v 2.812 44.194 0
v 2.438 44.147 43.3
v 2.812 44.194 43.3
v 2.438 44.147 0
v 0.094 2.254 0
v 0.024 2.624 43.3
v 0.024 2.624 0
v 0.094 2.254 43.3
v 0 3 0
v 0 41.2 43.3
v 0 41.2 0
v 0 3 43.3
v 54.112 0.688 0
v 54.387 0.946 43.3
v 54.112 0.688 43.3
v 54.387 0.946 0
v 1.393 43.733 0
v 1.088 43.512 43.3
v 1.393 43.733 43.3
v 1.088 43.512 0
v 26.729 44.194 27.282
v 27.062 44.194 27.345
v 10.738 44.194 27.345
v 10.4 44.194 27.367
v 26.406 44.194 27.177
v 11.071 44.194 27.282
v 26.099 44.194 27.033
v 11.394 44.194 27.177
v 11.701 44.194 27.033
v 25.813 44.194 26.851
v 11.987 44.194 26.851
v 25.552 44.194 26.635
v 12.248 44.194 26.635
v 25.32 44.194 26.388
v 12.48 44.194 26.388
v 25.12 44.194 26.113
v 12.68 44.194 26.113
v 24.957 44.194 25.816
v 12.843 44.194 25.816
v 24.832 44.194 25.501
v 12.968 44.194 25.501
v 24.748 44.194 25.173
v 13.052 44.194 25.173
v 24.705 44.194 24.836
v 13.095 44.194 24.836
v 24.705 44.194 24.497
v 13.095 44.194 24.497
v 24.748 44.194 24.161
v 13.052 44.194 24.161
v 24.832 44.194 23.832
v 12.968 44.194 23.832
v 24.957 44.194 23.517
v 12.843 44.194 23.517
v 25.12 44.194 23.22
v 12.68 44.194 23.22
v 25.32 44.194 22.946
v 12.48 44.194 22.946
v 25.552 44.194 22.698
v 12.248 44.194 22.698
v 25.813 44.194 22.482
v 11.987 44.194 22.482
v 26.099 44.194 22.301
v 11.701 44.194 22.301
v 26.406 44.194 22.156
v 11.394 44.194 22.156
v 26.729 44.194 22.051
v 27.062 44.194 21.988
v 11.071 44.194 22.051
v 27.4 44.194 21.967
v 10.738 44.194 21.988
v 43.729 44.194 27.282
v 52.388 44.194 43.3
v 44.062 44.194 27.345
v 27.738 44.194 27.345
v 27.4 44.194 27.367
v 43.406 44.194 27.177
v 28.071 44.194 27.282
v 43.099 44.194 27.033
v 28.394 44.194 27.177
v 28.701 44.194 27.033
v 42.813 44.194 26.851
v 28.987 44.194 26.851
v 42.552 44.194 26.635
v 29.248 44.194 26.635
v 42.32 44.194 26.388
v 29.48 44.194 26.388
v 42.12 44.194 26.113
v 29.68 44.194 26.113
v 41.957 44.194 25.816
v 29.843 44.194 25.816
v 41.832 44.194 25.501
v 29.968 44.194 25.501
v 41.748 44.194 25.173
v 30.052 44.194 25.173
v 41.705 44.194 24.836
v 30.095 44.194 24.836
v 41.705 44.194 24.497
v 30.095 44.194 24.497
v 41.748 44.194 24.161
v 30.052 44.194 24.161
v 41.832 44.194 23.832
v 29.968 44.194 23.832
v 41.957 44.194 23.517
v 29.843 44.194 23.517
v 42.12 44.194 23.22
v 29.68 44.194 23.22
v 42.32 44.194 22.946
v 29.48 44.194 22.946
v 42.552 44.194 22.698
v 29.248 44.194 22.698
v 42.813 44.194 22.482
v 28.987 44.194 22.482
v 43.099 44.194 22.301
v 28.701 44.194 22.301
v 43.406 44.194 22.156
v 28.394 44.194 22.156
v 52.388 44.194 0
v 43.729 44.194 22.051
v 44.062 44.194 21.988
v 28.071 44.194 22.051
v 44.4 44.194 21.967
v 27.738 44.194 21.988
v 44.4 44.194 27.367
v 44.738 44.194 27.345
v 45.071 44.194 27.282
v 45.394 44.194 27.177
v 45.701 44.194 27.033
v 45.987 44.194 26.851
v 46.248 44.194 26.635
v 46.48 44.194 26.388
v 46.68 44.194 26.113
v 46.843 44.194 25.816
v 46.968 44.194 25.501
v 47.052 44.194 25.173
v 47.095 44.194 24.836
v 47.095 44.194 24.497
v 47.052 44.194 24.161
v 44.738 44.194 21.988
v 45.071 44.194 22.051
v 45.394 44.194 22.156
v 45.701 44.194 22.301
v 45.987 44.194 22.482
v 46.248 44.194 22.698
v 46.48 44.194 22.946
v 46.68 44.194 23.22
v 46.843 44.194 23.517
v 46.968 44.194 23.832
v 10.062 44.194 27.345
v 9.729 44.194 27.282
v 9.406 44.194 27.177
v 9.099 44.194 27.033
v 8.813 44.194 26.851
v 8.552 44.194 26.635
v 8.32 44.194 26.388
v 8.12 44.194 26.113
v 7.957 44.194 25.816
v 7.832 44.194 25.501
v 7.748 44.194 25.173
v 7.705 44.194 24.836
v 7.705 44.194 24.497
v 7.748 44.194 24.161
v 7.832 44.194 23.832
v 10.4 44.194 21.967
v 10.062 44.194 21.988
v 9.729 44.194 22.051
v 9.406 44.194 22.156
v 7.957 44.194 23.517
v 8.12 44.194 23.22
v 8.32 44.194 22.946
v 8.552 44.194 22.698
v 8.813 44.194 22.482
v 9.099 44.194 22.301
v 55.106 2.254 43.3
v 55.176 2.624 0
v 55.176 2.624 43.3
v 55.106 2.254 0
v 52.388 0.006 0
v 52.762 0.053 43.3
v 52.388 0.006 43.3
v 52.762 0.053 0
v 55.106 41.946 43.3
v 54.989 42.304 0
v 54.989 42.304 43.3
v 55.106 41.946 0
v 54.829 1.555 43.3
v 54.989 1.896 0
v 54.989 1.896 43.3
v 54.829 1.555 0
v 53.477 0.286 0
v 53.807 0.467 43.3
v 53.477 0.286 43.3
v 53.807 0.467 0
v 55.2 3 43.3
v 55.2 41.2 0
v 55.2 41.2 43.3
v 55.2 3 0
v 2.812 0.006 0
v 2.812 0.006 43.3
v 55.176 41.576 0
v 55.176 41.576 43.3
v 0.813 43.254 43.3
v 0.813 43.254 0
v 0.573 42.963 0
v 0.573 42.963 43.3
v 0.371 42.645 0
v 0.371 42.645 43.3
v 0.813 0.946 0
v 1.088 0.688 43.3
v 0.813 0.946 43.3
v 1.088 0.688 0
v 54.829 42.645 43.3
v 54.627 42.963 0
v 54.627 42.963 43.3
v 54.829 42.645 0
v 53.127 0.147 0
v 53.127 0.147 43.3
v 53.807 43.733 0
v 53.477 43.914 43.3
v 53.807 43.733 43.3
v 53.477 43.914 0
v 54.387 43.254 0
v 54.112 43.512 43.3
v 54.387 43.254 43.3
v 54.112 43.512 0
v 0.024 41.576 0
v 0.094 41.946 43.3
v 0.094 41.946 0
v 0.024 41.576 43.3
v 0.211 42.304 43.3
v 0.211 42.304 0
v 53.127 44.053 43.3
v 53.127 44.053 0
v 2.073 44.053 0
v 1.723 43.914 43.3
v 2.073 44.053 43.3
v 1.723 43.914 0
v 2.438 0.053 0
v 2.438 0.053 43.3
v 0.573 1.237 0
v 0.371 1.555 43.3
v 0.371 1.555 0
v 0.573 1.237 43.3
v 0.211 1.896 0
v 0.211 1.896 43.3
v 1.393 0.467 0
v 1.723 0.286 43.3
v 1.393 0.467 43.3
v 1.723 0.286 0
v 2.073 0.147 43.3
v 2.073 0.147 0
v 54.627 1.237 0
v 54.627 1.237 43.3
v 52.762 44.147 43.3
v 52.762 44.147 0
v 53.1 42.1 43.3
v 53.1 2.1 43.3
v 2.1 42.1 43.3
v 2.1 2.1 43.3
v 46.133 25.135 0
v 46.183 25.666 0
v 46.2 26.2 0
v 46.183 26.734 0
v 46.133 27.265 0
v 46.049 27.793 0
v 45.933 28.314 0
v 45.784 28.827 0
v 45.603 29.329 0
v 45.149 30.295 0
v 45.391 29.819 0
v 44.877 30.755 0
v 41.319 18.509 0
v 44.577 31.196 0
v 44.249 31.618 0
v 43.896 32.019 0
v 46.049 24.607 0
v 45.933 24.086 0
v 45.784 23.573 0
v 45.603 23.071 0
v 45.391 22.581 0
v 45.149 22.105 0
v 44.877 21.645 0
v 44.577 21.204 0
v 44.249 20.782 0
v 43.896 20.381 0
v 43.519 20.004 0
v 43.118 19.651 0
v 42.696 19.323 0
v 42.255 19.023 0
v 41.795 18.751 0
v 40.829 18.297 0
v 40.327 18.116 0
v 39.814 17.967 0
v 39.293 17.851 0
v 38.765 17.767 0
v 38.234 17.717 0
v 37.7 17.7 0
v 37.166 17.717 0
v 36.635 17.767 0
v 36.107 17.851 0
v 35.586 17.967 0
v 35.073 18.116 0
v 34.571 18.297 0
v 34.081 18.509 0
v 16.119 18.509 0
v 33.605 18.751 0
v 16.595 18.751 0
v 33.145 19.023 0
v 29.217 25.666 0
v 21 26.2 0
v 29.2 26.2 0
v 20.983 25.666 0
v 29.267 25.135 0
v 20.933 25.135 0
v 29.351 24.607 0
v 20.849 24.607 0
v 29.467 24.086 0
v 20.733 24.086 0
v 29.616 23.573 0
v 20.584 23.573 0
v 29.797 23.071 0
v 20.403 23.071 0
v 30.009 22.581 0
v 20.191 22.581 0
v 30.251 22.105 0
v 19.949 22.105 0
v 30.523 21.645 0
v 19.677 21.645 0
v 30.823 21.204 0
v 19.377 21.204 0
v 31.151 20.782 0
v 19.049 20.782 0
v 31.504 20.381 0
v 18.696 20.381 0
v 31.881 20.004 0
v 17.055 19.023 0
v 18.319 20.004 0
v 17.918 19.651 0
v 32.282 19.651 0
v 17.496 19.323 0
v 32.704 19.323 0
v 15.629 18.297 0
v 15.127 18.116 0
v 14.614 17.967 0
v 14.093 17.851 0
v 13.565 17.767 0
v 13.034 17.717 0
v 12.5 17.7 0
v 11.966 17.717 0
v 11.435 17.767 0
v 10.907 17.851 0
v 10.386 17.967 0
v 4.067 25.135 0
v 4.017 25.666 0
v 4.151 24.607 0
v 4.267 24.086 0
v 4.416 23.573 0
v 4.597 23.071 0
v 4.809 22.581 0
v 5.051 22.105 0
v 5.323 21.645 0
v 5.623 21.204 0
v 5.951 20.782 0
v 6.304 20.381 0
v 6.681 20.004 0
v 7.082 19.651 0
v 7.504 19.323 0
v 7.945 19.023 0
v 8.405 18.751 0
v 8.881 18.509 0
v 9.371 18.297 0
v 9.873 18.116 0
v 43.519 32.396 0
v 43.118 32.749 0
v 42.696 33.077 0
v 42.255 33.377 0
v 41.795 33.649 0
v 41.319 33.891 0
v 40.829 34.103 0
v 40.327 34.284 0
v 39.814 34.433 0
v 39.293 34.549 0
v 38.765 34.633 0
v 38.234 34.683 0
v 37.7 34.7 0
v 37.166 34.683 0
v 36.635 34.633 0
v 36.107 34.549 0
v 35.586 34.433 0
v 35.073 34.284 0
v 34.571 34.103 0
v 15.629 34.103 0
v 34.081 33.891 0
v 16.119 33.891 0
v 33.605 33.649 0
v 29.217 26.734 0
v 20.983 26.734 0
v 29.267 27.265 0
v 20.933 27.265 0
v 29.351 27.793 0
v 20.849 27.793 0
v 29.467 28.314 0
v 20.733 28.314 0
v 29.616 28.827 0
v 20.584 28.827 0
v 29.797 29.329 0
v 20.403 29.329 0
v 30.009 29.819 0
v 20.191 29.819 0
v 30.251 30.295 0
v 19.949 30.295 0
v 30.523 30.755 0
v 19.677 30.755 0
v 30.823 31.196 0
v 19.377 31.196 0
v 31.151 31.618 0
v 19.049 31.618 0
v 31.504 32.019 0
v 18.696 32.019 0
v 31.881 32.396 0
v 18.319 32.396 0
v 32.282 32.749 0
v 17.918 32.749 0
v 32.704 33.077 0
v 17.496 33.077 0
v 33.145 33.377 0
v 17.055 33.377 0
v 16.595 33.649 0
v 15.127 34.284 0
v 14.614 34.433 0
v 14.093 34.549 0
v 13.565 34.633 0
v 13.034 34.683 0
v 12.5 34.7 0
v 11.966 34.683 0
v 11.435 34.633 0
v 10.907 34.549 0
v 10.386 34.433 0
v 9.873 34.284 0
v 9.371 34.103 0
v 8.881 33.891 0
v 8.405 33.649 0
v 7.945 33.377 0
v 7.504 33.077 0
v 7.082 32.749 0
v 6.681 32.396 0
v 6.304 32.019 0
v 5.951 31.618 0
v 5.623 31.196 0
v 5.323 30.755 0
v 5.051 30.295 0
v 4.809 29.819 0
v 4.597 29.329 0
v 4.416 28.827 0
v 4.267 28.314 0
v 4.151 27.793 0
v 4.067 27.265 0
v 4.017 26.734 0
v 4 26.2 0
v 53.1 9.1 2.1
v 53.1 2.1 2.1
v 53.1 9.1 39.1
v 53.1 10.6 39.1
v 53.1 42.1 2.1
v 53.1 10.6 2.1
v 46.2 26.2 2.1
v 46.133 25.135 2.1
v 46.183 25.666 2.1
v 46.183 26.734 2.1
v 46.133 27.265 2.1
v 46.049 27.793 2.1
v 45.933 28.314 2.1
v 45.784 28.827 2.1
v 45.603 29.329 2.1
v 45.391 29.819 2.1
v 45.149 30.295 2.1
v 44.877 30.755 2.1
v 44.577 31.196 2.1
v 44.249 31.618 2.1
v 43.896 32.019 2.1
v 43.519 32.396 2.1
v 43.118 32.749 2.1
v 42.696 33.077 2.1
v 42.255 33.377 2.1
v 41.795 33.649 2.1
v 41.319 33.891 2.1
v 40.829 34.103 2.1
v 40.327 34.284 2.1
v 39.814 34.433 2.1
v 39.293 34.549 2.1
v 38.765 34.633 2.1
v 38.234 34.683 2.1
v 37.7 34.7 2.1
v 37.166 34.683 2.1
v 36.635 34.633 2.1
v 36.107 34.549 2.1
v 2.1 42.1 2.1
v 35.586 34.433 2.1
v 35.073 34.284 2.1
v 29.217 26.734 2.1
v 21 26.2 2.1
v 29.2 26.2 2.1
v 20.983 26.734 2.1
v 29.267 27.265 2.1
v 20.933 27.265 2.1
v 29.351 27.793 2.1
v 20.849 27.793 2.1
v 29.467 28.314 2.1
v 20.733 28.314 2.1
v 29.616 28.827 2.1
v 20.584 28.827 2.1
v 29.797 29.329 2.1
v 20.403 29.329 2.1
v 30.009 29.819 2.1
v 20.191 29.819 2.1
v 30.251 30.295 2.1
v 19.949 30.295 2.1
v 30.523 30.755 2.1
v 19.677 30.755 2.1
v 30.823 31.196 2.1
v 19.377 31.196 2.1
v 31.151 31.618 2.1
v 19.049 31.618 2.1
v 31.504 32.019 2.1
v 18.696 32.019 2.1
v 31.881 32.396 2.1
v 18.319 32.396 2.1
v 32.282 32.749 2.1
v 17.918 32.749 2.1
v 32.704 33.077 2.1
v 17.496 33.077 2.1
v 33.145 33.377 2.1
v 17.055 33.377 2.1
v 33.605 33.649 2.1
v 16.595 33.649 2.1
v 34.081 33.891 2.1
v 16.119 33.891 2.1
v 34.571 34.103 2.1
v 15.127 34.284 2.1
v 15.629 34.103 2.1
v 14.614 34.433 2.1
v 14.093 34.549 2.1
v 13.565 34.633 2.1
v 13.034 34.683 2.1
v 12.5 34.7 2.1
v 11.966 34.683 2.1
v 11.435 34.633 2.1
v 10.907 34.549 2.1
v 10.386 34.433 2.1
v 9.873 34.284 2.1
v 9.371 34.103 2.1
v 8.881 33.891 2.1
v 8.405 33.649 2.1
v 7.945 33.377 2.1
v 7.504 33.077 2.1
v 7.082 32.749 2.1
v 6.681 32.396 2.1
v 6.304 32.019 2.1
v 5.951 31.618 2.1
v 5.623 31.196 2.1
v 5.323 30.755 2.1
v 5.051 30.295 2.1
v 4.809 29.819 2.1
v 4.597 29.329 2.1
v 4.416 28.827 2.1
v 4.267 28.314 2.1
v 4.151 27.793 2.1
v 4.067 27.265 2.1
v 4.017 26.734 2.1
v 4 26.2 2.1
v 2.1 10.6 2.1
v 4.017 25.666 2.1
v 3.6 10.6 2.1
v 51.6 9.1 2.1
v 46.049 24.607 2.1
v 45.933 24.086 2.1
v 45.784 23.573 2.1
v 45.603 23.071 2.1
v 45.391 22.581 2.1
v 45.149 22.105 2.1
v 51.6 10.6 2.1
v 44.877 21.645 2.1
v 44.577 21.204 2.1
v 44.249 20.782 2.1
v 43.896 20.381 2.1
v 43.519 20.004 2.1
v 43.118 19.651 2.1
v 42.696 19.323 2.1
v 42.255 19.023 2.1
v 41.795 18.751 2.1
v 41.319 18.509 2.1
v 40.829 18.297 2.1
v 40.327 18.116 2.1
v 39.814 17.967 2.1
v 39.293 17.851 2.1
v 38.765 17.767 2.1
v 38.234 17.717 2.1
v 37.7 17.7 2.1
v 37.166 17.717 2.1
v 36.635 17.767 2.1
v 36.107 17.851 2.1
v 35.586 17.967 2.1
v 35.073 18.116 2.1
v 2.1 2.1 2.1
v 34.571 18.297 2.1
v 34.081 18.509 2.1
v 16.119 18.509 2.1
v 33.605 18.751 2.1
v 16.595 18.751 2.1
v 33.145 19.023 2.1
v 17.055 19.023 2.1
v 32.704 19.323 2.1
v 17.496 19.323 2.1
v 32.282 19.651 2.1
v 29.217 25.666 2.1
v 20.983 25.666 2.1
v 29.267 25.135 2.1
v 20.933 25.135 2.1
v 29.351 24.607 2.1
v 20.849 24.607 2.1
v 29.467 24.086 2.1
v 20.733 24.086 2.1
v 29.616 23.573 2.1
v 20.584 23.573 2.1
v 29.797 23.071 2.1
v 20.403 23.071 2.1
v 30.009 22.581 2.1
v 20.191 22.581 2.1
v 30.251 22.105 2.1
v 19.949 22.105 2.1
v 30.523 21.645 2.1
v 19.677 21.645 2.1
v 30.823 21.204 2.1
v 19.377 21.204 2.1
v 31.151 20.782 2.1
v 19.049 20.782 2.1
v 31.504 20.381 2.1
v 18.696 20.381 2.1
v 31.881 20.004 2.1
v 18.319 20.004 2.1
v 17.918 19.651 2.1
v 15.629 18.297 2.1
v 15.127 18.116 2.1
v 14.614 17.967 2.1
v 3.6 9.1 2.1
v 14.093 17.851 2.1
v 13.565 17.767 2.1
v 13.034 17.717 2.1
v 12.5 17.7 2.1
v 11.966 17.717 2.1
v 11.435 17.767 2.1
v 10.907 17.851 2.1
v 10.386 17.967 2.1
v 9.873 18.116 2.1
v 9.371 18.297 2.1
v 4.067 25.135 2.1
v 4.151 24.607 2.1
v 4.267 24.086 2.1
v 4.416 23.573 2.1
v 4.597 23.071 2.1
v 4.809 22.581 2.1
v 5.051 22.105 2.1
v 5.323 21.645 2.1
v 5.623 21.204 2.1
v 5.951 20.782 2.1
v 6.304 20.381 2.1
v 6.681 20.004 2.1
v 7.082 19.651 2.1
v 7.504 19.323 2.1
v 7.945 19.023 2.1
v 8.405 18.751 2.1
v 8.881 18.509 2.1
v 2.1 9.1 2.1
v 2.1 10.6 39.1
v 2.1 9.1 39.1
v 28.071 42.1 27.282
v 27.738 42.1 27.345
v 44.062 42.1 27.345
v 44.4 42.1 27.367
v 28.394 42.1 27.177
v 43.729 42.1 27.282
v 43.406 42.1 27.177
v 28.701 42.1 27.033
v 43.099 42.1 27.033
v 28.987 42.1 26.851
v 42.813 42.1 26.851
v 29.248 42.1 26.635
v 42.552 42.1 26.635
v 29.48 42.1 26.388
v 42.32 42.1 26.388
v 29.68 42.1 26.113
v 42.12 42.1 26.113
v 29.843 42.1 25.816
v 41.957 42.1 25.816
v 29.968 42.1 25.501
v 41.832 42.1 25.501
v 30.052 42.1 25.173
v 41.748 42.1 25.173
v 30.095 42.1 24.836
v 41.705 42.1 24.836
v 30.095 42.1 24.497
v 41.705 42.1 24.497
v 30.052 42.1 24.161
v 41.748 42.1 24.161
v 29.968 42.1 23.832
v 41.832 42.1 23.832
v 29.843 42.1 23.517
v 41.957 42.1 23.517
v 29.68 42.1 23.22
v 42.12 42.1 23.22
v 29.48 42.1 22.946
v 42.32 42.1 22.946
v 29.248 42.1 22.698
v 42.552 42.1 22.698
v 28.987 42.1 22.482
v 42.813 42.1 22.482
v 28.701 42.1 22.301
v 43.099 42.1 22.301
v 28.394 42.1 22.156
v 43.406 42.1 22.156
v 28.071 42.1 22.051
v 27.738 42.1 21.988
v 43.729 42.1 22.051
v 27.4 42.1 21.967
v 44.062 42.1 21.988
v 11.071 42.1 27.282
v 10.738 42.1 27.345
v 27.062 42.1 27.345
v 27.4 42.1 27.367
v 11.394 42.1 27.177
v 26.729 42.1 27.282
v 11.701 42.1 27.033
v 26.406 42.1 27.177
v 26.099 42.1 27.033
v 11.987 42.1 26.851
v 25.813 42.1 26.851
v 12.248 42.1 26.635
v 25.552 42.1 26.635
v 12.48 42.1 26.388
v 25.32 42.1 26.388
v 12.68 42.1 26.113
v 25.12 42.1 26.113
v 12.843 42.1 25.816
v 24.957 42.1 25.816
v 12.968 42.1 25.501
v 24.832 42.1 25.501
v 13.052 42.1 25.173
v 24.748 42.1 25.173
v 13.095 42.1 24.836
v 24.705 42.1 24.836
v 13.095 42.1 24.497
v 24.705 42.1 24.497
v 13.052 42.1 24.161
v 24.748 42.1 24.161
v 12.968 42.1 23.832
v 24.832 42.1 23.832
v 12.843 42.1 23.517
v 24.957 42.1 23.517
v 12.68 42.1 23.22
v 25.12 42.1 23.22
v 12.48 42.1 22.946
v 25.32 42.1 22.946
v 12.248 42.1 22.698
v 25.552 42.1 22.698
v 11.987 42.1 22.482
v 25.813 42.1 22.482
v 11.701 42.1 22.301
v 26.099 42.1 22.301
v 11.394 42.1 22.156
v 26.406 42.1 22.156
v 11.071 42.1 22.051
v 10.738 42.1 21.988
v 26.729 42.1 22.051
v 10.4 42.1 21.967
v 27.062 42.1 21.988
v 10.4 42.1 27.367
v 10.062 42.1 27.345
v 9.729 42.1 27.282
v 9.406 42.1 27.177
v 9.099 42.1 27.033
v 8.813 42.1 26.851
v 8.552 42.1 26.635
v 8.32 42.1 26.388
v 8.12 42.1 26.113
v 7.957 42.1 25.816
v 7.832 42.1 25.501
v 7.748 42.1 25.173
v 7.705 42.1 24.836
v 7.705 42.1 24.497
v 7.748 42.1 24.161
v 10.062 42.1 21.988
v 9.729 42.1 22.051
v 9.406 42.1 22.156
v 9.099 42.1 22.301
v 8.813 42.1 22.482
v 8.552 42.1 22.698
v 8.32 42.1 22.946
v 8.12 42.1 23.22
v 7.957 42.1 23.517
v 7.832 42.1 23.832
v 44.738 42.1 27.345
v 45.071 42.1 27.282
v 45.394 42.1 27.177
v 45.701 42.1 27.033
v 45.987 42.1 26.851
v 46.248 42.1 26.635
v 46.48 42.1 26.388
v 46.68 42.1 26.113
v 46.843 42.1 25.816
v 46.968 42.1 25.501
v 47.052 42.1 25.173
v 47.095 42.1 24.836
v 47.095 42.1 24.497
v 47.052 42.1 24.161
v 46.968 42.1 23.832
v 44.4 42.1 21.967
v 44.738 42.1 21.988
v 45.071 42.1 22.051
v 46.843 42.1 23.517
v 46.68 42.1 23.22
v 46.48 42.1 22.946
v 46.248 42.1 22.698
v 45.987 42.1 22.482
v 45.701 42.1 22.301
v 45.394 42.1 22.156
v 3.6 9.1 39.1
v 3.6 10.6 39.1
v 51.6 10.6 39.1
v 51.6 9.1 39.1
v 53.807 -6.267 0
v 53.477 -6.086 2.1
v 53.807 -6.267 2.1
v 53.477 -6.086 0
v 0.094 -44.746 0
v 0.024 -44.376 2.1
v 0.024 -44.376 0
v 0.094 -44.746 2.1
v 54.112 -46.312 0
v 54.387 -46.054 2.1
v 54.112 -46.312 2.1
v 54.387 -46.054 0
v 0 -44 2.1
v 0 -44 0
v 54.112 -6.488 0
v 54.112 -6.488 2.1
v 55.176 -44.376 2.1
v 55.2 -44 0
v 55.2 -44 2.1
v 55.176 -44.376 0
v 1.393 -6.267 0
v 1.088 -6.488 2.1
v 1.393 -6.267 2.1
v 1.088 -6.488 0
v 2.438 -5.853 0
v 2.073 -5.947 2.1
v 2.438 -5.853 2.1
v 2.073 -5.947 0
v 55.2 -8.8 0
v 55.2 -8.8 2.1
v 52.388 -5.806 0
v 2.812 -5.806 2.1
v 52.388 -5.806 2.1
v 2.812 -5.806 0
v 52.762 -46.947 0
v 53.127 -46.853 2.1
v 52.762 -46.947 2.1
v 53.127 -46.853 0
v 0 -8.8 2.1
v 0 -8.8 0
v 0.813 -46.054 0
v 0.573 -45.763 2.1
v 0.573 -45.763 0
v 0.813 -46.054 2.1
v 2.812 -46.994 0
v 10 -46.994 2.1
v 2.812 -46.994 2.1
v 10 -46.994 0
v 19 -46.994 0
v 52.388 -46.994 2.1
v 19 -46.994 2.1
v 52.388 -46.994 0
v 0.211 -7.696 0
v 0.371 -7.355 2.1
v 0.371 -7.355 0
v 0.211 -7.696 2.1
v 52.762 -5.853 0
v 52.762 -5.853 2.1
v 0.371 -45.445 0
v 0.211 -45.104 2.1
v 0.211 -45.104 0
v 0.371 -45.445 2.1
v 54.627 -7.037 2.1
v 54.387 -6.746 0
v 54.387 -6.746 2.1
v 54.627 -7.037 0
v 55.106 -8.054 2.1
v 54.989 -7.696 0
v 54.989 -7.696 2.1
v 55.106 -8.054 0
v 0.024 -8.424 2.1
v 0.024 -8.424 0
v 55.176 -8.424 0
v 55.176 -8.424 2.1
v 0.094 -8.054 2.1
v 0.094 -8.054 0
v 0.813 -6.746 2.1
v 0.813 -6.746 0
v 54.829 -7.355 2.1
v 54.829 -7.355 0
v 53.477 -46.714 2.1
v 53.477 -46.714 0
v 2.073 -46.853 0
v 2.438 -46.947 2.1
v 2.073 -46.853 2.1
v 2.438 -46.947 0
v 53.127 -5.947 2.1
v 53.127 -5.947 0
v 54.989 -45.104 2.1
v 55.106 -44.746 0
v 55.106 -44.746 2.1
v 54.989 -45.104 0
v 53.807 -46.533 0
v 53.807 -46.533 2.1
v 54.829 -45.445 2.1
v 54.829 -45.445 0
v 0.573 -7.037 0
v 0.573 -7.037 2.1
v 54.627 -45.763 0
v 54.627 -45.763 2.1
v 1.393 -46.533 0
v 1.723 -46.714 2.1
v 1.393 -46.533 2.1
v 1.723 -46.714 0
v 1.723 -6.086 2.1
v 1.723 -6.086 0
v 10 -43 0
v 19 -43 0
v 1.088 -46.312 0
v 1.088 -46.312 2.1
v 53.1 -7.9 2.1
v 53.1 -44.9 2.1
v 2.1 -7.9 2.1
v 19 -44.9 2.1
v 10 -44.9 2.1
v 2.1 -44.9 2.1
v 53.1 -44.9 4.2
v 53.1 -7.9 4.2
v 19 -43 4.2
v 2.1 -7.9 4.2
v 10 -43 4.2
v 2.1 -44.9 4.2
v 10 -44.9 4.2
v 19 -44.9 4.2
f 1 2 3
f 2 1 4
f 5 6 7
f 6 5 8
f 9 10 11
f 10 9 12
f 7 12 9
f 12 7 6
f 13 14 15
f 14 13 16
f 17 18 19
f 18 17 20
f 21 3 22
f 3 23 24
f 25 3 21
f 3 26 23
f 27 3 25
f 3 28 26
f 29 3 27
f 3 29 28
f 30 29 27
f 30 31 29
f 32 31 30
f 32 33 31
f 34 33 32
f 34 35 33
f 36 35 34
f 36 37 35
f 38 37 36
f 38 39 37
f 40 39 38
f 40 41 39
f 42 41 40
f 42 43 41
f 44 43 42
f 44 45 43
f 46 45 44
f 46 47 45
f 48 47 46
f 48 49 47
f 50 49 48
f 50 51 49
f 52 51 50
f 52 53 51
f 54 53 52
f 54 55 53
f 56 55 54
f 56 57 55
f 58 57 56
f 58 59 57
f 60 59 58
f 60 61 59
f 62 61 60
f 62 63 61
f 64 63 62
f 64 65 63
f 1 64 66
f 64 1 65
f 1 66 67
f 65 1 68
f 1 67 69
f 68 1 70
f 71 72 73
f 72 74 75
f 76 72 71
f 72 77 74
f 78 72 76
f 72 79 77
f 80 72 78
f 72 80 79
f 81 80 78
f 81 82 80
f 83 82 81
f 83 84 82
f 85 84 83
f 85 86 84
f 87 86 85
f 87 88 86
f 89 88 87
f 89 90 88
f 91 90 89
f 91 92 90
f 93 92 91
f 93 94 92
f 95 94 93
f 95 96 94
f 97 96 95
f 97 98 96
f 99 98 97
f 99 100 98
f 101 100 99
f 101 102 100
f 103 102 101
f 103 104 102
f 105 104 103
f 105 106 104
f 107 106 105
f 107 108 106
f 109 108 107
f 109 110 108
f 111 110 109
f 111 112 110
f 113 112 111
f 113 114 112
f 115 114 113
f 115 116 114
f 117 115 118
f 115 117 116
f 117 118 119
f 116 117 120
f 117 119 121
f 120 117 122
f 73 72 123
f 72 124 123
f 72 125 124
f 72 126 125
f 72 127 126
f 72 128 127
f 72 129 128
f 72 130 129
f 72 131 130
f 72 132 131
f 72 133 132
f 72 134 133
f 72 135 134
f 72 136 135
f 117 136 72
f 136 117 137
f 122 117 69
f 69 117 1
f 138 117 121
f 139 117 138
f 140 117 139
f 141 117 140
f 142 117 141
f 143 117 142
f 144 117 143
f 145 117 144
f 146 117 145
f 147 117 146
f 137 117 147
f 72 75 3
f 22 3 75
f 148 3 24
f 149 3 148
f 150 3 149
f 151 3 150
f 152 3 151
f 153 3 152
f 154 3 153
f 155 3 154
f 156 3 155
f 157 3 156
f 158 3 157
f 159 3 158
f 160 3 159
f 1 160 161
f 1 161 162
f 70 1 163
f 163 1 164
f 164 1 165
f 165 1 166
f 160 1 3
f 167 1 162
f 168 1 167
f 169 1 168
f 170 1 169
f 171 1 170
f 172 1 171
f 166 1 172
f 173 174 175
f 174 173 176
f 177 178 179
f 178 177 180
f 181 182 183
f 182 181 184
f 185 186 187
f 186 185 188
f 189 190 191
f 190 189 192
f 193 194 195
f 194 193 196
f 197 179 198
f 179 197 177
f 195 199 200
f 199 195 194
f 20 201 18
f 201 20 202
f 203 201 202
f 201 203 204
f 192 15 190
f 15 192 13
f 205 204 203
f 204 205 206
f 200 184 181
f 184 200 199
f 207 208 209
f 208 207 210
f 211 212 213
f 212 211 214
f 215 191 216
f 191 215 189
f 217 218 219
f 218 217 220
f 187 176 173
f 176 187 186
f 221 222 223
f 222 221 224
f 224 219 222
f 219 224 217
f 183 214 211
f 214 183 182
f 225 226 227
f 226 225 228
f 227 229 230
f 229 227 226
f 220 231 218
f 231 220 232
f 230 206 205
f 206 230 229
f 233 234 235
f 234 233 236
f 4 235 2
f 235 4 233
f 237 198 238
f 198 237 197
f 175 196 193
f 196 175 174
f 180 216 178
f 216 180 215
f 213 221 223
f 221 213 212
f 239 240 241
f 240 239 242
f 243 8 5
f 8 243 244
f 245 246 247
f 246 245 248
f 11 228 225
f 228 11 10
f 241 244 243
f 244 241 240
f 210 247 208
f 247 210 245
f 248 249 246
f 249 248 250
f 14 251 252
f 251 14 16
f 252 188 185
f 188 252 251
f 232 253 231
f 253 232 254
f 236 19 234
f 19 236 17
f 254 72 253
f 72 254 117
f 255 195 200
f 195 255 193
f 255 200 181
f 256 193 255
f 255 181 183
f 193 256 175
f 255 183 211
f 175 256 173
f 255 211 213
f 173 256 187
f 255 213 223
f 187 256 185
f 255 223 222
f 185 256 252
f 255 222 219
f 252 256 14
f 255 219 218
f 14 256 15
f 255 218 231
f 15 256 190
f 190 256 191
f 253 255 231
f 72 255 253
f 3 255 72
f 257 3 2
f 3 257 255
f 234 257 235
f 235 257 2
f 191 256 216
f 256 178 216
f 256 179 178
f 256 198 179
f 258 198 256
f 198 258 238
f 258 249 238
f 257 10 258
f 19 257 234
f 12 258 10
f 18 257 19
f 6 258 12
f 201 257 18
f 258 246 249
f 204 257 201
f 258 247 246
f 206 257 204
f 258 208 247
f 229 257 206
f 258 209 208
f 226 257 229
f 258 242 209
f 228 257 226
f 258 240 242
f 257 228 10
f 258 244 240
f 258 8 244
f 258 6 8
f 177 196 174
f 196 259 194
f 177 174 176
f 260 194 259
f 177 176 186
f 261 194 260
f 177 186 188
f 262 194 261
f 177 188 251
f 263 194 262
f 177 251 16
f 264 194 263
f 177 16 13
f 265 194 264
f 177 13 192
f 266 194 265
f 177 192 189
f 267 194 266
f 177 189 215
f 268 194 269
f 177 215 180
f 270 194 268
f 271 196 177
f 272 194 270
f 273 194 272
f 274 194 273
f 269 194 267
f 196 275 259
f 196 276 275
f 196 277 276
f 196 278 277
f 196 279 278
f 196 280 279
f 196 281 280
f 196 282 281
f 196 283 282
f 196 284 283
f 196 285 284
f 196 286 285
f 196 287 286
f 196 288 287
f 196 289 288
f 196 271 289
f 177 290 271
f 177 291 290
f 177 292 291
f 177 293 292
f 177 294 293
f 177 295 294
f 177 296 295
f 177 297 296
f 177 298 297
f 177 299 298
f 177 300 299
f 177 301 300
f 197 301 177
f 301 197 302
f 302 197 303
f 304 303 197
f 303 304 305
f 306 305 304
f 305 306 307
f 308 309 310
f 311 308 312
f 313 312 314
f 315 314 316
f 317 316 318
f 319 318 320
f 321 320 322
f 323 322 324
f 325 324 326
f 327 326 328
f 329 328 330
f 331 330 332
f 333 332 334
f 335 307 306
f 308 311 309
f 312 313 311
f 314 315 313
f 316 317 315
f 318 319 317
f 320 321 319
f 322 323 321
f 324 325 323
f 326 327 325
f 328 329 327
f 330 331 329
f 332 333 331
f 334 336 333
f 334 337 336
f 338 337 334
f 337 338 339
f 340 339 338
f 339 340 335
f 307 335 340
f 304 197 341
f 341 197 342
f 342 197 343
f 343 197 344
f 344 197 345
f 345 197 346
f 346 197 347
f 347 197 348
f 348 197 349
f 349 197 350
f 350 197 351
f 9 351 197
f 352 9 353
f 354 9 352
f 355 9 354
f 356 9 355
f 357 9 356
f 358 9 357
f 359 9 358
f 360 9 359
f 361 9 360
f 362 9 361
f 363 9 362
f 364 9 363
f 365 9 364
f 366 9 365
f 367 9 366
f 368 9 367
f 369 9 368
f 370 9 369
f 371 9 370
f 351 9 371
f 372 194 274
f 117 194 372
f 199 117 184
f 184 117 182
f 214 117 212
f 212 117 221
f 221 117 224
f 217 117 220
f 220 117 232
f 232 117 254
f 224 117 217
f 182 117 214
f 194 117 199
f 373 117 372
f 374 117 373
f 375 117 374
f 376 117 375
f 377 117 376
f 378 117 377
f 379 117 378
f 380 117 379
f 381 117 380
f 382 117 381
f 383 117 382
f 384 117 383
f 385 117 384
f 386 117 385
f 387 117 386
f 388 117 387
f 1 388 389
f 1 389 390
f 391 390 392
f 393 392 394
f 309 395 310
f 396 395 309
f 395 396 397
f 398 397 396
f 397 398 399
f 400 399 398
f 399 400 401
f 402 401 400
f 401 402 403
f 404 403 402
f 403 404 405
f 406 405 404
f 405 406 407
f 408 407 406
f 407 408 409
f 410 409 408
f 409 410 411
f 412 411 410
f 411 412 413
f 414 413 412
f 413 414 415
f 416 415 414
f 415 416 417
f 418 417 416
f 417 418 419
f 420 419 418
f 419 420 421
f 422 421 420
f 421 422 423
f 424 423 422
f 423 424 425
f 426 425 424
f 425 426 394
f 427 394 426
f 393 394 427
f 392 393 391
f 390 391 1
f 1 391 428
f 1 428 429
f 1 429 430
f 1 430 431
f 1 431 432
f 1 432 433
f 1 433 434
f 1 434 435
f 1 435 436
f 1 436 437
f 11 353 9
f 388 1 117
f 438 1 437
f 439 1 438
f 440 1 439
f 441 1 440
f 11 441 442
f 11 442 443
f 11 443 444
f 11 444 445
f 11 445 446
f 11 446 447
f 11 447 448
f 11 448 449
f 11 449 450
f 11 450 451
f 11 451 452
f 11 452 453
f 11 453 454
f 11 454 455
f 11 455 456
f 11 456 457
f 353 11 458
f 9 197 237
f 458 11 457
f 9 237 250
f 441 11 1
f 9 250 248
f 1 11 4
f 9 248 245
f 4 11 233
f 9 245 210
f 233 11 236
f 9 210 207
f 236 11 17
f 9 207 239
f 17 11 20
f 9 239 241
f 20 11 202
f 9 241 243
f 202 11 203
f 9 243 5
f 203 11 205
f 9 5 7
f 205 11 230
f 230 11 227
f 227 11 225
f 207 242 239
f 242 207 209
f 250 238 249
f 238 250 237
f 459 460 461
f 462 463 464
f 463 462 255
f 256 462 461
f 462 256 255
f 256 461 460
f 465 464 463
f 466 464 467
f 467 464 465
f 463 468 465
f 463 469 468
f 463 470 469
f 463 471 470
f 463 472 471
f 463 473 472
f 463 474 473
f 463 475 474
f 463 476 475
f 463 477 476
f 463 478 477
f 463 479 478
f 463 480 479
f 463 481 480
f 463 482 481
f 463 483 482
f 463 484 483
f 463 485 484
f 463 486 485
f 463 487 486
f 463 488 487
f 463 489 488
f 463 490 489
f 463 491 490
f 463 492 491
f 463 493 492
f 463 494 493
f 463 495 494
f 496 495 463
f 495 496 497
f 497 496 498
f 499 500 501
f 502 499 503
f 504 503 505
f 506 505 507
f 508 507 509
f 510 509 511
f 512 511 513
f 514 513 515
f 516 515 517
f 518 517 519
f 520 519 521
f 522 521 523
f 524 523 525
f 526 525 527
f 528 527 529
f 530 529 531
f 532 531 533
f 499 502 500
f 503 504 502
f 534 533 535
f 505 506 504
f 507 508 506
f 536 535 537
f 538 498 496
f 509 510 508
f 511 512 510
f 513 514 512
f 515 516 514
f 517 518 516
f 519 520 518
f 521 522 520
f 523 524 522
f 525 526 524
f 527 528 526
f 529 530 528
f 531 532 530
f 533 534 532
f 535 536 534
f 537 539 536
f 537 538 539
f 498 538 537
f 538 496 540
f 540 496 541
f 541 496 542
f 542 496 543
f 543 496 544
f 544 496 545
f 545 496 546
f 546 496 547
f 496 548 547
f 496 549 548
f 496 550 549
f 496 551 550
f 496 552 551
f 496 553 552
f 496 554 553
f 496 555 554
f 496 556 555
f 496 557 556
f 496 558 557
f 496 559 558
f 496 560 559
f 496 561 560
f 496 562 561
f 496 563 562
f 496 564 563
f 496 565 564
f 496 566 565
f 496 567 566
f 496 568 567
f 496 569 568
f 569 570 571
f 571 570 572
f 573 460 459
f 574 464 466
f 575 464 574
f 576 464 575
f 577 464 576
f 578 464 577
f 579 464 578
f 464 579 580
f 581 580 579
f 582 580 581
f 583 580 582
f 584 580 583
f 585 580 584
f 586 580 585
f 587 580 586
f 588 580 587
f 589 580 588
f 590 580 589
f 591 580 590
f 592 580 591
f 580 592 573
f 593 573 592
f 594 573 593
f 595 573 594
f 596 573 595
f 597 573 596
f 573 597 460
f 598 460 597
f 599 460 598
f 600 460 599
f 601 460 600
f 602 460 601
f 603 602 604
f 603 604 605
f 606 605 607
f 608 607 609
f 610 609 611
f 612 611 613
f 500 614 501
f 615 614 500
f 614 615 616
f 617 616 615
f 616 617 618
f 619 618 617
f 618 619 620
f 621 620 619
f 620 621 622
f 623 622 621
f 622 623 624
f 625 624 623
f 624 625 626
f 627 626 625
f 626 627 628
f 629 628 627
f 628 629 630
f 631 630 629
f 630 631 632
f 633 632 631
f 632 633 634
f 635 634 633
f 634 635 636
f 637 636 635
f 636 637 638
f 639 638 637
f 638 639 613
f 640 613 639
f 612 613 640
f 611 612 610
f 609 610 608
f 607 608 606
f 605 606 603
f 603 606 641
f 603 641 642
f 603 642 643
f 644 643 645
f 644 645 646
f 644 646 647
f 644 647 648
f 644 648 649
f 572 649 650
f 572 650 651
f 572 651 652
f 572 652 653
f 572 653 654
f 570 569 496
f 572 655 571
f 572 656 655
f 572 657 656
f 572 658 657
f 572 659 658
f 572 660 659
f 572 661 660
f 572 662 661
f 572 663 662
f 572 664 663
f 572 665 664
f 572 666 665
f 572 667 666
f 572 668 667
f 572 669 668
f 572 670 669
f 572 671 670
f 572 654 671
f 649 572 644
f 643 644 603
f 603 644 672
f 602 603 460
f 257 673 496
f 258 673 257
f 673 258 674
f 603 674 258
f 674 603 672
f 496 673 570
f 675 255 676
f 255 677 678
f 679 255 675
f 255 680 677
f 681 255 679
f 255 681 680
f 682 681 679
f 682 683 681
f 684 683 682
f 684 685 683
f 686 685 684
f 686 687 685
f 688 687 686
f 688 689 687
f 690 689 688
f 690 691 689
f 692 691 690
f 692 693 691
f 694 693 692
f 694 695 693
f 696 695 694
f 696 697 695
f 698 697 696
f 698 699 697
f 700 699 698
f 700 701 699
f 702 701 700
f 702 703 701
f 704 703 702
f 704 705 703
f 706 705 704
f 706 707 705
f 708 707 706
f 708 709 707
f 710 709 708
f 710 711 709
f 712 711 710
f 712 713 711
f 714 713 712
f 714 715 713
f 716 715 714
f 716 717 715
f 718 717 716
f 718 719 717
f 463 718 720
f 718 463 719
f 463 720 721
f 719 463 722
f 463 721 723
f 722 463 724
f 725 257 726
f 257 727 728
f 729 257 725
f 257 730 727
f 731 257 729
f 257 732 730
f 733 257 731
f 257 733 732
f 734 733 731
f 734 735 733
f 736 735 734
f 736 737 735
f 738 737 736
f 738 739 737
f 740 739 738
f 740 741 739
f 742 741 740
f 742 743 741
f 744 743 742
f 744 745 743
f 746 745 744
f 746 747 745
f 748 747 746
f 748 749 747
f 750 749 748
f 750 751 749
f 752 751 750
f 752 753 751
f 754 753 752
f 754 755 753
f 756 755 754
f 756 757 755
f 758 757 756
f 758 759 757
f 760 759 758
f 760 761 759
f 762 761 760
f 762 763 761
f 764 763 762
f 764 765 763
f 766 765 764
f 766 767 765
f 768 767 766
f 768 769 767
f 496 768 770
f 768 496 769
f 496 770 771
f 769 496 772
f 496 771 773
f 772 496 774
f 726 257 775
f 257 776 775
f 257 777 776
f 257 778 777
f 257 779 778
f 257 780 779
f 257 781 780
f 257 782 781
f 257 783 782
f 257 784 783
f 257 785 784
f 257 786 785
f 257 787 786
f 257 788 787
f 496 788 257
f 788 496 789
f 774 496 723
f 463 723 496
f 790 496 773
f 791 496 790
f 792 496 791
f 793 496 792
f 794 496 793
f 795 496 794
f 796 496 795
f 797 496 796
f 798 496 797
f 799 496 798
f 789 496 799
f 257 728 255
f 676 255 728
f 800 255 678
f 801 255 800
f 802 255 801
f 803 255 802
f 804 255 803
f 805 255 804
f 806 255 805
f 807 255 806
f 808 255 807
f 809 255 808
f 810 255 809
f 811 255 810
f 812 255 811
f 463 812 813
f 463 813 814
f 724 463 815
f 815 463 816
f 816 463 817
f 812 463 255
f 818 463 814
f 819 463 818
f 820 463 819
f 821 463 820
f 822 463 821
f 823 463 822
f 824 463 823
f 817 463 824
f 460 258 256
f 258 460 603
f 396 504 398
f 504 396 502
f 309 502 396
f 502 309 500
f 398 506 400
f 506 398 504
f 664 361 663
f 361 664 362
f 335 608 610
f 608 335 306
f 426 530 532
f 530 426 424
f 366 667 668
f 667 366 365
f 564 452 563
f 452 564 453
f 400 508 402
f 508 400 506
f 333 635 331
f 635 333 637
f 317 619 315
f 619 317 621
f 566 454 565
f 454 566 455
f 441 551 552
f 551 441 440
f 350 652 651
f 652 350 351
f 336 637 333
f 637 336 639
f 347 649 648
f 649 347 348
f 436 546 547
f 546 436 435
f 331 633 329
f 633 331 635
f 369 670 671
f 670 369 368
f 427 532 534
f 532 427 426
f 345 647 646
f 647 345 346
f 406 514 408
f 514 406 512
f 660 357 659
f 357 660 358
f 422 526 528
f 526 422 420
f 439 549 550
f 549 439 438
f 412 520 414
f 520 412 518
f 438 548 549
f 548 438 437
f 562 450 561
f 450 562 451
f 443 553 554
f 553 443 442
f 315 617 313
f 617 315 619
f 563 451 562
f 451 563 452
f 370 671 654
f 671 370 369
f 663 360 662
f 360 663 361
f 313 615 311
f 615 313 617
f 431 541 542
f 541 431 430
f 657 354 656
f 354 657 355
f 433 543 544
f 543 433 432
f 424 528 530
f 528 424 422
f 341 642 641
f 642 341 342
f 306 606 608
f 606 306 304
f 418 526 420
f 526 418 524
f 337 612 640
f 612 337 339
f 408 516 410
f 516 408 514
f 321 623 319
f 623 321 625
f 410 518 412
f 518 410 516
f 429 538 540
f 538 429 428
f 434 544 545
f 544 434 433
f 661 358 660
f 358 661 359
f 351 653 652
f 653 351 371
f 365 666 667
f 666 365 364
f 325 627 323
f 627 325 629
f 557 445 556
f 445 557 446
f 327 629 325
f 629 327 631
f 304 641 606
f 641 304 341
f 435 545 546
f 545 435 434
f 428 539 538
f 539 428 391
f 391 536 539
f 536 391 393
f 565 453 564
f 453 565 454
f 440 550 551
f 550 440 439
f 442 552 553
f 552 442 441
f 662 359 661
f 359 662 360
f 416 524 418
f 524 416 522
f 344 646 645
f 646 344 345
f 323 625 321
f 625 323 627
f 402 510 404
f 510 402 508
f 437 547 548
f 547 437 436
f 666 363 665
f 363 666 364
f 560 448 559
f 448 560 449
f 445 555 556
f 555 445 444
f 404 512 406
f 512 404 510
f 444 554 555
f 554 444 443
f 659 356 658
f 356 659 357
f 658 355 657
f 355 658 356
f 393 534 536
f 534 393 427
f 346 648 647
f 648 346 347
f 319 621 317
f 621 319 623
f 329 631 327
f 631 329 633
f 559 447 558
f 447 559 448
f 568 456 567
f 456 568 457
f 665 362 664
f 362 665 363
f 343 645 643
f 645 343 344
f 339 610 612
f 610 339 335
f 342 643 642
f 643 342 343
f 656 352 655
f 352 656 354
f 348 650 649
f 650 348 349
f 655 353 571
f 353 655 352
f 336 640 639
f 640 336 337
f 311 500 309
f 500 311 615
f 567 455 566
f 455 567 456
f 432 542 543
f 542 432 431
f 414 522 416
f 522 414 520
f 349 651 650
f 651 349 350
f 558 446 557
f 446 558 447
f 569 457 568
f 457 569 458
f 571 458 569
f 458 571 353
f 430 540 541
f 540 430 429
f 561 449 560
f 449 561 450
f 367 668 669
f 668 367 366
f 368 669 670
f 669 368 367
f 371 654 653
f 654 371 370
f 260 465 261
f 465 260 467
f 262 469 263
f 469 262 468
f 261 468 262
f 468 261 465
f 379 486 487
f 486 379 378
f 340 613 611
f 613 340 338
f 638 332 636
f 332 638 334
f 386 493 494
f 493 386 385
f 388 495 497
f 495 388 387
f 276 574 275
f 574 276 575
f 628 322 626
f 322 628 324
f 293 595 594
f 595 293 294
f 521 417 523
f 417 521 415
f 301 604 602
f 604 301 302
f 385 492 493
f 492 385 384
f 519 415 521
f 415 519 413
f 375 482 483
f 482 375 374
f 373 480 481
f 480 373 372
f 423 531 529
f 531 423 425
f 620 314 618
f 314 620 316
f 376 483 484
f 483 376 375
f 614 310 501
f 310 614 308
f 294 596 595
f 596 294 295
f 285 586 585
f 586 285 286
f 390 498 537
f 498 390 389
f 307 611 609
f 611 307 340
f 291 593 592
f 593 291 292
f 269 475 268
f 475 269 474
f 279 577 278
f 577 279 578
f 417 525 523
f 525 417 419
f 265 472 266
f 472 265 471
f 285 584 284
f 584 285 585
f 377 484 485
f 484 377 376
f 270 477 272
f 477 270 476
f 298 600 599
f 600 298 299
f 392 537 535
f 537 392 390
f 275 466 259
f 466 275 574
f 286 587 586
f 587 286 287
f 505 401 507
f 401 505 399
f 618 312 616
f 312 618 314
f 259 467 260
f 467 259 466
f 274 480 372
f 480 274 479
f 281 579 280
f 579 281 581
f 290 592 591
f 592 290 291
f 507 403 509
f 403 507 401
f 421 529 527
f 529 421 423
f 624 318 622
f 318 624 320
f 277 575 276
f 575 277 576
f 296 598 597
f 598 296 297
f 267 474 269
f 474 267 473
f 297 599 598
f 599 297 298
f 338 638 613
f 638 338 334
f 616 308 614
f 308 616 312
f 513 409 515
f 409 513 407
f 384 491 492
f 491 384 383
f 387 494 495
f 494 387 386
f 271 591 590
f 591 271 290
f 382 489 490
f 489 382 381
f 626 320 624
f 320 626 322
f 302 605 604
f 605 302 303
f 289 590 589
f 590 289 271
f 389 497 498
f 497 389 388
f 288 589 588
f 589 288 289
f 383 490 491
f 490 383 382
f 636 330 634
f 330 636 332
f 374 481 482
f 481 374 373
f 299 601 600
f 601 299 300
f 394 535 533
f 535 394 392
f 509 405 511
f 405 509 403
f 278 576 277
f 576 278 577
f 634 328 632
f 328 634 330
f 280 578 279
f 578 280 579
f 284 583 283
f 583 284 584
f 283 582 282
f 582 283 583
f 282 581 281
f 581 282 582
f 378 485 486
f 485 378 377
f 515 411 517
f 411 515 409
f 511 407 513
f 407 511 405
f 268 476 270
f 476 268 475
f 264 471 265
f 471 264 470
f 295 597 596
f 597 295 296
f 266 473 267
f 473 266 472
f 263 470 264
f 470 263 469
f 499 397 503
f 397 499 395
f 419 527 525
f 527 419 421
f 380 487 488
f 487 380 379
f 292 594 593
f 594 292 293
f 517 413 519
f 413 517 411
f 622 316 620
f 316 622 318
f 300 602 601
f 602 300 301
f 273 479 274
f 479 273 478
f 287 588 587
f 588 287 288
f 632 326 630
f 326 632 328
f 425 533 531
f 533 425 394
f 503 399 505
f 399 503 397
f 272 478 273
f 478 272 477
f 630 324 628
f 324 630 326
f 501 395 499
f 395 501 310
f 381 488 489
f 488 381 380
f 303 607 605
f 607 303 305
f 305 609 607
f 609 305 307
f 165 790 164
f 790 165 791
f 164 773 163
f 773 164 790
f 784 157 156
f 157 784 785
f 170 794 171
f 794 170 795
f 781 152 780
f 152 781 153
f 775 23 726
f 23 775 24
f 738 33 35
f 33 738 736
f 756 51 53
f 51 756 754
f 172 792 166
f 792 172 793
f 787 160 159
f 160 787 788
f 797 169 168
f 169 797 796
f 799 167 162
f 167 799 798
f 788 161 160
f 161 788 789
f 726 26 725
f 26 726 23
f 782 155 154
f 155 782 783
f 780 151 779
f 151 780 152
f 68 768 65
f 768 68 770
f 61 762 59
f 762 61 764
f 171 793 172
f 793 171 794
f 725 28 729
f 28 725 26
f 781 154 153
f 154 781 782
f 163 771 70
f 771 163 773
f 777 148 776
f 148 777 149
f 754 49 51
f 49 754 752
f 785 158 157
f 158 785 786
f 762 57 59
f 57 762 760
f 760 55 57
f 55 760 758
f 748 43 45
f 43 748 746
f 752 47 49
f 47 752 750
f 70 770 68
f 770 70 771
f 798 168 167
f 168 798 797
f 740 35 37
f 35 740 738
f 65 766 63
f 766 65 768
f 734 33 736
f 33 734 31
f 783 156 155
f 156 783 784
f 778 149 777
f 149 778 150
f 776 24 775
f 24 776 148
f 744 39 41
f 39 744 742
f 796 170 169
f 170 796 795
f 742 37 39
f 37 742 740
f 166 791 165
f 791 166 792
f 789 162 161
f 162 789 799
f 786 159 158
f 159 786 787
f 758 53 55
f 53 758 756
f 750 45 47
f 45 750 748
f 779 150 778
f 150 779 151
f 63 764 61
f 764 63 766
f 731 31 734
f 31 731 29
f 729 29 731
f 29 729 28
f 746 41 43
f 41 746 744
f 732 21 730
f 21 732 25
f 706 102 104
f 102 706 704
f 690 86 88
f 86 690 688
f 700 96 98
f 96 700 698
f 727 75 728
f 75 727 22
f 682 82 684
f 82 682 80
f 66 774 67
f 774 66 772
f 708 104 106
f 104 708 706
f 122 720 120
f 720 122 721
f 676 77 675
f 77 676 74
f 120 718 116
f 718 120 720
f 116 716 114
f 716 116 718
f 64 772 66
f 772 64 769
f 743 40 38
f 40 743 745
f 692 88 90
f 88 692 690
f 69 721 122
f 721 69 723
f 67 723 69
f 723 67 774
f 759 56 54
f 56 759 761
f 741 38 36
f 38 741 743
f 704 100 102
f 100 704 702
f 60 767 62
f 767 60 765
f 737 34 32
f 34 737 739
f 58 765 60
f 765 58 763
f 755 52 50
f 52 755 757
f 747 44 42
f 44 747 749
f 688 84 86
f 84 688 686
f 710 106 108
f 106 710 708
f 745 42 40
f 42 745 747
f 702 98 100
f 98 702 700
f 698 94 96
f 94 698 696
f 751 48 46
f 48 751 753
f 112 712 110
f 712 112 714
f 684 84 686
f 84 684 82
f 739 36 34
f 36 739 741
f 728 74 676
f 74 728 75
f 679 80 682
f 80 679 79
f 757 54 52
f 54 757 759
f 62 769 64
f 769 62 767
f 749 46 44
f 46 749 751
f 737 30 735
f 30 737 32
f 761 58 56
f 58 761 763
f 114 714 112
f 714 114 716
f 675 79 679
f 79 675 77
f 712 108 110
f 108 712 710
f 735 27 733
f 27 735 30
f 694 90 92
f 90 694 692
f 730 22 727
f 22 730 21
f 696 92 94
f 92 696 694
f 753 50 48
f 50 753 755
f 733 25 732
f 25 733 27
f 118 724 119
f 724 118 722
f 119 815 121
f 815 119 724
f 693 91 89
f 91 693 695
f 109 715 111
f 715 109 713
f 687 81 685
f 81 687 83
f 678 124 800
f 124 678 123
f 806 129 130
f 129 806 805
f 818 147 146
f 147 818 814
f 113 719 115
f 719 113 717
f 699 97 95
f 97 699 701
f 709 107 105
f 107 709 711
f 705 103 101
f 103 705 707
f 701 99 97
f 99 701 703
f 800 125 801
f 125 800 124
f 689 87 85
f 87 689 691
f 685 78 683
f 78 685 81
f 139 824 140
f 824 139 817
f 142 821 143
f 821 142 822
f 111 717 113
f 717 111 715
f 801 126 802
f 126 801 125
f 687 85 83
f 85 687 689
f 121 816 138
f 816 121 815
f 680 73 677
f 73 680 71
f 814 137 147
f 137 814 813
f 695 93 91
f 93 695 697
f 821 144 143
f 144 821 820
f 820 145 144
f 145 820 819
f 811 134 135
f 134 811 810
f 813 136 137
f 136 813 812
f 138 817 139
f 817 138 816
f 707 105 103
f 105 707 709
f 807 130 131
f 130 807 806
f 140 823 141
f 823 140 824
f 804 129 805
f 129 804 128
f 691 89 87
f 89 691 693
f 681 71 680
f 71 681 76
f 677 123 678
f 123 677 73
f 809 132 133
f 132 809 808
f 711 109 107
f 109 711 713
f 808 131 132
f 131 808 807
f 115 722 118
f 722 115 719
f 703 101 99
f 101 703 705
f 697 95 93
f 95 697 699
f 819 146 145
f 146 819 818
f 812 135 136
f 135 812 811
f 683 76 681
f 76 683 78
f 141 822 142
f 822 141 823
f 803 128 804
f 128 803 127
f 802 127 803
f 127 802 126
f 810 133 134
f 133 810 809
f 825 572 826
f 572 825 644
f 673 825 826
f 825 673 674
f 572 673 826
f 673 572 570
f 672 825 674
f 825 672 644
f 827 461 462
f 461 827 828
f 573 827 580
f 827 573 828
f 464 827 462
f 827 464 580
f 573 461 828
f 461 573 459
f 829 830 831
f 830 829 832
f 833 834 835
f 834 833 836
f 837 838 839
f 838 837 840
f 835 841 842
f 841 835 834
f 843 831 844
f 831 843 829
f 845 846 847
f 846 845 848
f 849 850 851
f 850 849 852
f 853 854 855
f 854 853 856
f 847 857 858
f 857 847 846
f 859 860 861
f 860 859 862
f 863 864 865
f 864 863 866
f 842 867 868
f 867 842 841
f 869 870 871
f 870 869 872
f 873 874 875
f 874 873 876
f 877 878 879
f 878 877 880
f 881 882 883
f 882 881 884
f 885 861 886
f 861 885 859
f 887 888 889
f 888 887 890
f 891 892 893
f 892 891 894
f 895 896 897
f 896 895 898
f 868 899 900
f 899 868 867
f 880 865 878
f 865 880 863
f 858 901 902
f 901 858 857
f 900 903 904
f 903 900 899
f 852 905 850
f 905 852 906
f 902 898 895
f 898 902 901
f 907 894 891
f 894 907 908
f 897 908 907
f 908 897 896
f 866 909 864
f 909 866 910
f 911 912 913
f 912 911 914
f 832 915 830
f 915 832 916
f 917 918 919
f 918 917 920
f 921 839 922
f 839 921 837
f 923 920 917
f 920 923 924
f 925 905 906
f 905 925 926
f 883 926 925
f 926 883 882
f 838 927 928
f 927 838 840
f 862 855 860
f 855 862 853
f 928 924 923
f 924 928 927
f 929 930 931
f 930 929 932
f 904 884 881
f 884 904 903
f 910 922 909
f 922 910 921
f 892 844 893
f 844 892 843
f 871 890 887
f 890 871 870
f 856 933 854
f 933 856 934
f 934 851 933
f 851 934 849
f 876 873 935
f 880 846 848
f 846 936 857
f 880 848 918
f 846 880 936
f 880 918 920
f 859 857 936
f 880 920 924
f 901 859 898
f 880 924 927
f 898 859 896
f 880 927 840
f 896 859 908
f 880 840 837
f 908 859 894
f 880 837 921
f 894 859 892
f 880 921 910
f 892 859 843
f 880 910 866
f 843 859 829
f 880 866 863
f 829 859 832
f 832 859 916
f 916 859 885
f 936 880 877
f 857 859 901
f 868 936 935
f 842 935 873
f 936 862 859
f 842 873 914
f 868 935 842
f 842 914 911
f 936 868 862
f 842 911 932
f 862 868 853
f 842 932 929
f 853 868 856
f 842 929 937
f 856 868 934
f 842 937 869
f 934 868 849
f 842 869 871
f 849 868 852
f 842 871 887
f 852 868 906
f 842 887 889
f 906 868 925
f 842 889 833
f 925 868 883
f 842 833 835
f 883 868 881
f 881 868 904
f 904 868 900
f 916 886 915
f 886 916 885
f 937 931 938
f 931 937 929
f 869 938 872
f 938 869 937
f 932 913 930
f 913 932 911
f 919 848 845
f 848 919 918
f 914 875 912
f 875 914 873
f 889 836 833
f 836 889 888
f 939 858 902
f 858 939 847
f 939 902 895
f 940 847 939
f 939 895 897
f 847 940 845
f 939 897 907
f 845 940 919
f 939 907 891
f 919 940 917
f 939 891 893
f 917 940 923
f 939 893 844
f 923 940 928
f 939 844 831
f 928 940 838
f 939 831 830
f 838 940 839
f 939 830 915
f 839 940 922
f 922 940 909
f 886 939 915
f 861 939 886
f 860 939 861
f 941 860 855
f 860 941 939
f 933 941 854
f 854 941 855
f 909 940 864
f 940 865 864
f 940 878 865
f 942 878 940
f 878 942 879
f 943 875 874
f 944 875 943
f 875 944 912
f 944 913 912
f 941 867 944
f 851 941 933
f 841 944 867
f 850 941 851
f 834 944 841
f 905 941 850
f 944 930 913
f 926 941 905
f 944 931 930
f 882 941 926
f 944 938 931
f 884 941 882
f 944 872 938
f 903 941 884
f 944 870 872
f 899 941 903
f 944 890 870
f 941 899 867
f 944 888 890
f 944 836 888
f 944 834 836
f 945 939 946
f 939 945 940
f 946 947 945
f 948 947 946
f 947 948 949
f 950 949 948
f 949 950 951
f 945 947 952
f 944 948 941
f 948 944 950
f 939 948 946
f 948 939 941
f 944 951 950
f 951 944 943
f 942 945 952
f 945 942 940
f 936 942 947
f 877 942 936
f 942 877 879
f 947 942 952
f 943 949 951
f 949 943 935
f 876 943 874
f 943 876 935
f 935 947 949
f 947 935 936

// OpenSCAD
// file: toolbox.scad
/********************************************
Einige Hilfsmodule für die 3D-Druck Konstrukte
Copyright (c) 2018 by G. Weirich
*********************************************/
/*
    Viereckige Dose. Parameter: Innenmasse, Wanddicke
*/
module box(inner_size,thick){
    difference(){
        cube([inner_size.x+2*thick,inner_size.y+2*thick,inner_size.z+2*thick]);
        translate([thick,thick,thick])
            cube([inner_size.x,inner_size.y,inner_size.z+2*thick]);
    }
}

/*
    Deckel für Box
*/
module cover(inner_size,thick){
  cube([inner_size.x+2*thick,  inner_size.y+2*thick, thick]);
  translate([thick,thick,thick])
        cube([inner_size.x,inner_size.y,thick]);
}
/*
    Viereckige Dose mit gerundeten Ecken
    Parameter: Innenmasse, Radius der Eckenrundungen, Wanddicke
*/
module roundedBox(inner_size,radius,thick){
    difference(){
        roundedRect([inner_size.x+2*thick,inner_size.y+2*thick,inner_size.z+2*thick],radius);
        translate([thick,thick,thick])
            cube([inner_size.x,inner_size.y,inner_size.z+2*thick]);
    }
}

/*
    Eine Strecke innerhalb einer anderen Strecke zentrieren.
    Parameter: Länge der äusseren Strecke, Länge der inneren Strecke.
*/
function center(outer,inner)=(outer-inner)/2;

/*
    cube mit gerundeten Ecken.
    Parameter: Aussenmasse, Radius der Eckenrundungen.
*/
module roundedRect(size, radius,steps=50)
{
    x = size[0];
    y = size[1];
    z = size[2];
    linear_extrude(height=z)
        hull(){
            translate([radius, radius, 0])
            circle(r=radius,$fn=steps);

            translate([x-radius, radius, 0])
            circle(r=radius, $fn=steps);

            translate([x-radius, y-radius, 0])
            circle(r=radius,$fn=steps);

            translate([radius, y-radius, 0])
            circle(r=radius,$fn=steps);
            
        }

}

/*
    Deckel für gerundete Box
*/
module roundedCover(inner_size,radius,thick){
  roundedRect([inner_size.x+2*thick,  inner_size.y+2*thick, thick],radius);
  translate([thick,thick,thick])
        cube([inner_size.x,inner_size.y,thick]);
}
// main file
/**********************************************************
    Gehäuse für einen HC-SR04 oder 05 Ultraschall Sensor, 
    einen Arduino Nano und 3 LEDs
    
    Schichtdicke: 0.3 mm, Filament PLA 1.75 mm
*********************************************************/
include <toolbox.scad>

thick=2.1;              // Wanddicke. 
length=46+2*thick;      // Platzbedarf für den HC-SR 04
width=21+2*thick;
depth=17+thick;
diameter=17;            // Durchmesser der Sender/Empfänger
offset=1.9;             // Abstand Sender/Empfänger von Wand
steps=100;              // Schritte für Kreisberechnung
platine_t=1.5;          // Masse der Platine mit dem Arduino
platine_w=37;
platine_l=51;
clearance_floor=7;      // Abstand von der Unterseite für Verdrahtungen etc.
racksize=1.5;           // Grösse der Führungsschienen für die Platine
level_y=clearance_floor+thick+platine_t+racksize;
ledsize=5.4;            // Durchmesser der LEDs (inkl. Schrumpfkorrektur)

/*
    Die Box
*/    
union(){
    difference(){
         roundedBox([platine_l,40,platine_w+thick],3,thick);  
         translate([
                diameter/2+offset+thick,
                diameter/2+center(width,diameter)+level_y+platine_t,
                -offset])
                    cylinder(r=diameter/2,h=depth+5,$fn=steps);
         translate([length-diameter/2-offset-thick,
                    diameter/2+center(width,diameter)+level_y+platine_t,
                    -offset])
                    cylinder(r=diameter/2,h=depth+5,$fn=steps);
        ledspace=platine_l/3;
        ledoffs=4+center(ledspace,ledsize)+ledsize/2;
        led(ledoffs);
        led(ledspace+ledoffs);
        led(2*ledspace+ledoffs);
    }

    rack([thick,clearance_floor+thick,thick]);
    rack([platine_l+thick-racksize,clearance_floor+thick,thick]); 
}

/*
    Der Deckel
*/
union(){
        difference(){
            translate([0,-(platine_w+10),0]){
                roundedCover([platine_l,platine_w,0],3,thick);
            }
            // Kabel-Durchführung
            translate([10,-(platine_w+10),-5]){
                 cube([9,4,10]);
            }
        }
    
}
module led(x){
        translate([x-thick,platine_w,2*platine_w/3])
            rotate([0,90,90])
                cylinder(r=ledsize/2,h=10,$fn=50);           

}
    

module rack(pos){
translate(pos) 
    cube([racksize,racksize,platine_w]);

}
